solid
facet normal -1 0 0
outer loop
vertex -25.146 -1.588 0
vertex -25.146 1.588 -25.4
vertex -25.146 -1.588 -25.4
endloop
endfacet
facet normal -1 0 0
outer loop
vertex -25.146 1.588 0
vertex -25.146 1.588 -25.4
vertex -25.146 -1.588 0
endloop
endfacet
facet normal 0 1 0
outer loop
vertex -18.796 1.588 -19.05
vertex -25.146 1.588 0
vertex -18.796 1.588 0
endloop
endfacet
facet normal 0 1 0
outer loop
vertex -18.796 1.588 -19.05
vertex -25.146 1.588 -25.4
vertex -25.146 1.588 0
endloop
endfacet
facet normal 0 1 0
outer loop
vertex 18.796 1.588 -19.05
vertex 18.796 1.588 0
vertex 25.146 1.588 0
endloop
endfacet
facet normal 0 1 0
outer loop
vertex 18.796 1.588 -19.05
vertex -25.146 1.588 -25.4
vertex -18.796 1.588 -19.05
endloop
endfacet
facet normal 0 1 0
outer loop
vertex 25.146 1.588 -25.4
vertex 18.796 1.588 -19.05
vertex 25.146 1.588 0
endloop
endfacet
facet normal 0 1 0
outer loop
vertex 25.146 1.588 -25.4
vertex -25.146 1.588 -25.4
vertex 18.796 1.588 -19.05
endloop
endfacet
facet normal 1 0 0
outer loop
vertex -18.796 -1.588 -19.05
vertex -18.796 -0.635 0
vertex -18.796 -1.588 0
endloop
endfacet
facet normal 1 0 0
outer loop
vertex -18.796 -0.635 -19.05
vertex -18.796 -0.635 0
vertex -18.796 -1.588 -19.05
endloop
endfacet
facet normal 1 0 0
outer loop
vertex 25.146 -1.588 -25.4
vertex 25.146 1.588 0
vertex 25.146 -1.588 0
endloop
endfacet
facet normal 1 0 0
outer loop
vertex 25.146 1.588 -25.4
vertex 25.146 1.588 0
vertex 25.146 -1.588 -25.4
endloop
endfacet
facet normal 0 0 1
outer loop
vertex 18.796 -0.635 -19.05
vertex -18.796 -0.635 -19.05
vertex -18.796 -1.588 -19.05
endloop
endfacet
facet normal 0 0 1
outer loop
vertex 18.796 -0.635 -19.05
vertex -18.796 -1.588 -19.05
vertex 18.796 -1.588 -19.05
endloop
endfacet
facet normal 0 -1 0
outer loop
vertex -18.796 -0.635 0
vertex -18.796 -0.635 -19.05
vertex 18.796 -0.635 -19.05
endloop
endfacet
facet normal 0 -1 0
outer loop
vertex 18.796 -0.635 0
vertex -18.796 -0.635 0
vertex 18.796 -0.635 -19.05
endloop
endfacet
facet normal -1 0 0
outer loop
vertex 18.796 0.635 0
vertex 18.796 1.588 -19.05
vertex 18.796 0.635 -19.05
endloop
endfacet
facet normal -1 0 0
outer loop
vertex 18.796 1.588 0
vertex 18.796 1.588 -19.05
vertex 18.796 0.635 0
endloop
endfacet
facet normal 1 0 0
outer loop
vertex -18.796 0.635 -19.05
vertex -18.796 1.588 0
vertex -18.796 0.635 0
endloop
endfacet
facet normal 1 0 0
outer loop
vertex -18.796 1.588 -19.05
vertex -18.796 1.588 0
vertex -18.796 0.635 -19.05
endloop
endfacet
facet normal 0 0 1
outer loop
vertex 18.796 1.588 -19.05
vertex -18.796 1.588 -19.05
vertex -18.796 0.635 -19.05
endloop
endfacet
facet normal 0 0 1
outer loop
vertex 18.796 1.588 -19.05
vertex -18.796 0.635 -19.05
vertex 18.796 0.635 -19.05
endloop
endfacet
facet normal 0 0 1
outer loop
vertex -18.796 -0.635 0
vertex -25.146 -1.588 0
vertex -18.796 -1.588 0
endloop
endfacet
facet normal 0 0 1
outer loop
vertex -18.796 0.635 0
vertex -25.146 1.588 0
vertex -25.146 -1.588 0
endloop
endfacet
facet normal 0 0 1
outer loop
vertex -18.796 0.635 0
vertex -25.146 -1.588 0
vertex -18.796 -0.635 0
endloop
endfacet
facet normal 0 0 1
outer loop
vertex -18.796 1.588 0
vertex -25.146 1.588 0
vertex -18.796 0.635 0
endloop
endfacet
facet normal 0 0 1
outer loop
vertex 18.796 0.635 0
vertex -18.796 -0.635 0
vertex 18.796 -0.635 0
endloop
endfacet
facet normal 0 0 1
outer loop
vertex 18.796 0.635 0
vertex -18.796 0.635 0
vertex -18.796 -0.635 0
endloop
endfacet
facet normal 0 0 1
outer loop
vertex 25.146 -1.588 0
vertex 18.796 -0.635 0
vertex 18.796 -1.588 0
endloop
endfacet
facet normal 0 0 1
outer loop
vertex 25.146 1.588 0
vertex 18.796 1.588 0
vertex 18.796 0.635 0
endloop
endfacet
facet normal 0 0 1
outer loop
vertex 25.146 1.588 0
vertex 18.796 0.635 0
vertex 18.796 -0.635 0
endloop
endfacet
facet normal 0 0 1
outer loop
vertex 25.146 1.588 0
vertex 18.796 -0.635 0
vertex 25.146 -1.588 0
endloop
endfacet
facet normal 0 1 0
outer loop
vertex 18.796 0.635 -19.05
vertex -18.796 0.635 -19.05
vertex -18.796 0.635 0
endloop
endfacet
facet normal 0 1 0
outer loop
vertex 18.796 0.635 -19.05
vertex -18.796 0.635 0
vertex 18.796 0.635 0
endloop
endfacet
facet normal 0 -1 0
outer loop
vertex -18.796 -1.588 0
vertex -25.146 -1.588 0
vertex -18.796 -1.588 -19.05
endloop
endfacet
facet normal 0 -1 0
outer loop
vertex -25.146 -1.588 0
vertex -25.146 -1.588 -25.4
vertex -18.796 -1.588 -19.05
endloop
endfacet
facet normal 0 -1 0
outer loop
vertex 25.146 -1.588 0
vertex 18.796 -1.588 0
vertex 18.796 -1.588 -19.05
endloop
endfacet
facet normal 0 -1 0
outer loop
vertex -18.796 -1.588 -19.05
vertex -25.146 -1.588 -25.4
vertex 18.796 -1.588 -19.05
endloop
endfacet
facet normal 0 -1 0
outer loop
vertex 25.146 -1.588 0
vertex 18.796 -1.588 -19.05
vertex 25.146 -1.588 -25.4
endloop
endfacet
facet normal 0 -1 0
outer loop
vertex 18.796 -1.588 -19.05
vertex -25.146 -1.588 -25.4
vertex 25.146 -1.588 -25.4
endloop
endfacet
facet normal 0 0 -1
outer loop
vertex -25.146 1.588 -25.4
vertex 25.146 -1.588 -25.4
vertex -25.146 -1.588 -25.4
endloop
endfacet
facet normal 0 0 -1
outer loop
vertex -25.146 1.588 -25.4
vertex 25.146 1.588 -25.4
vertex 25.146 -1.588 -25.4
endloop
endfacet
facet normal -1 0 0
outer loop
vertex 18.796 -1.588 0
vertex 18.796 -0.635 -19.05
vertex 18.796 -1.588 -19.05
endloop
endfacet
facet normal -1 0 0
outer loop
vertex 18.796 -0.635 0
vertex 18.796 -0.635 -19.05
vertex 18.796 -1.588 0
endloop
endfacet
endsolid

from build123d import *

# Parameters (mm, degrees)
BOSS_EXTRUDE1_DEPTH = 1.5875
SKETCH2_W           = 37.592
SKETCH2_H           = 19.05
BOSS_EXTRUDE2_DEPTH = 0.635


with BuildPart() as part:
    # Sketch1 → Boss-Extrude1 (new, symmetric)
    with BuildSketch(Plane(origin=(0, 0, 0), x_dir=(1, 0, 0), z_dir=(0, 1, 0))):
        Polygon((-25.146, 0), (-18.796, 0), (-18.796, 19.05), (18.796, 19.05), (18.796, 0), (25.146, 0), (25.146, 25.4), (-25.146, 25.4), align=None)
    extrude(amount=BOSS_EXTRUDE1_DEPTH, both=True)

    # Sketch2 → Boss-Extrude2 (add, symmetric)
    with BuildSketch(Plane(origin=(0, 0, 0), x_dir=(1, 0, 0), z_dir=(0, 1, 0))):
        with Locations((0, 9.525)):
            Rectangle(SKETCH2_W, SKETCH2_H)
    extrude(amount=BOSS_EXTRUDE2_DEPTH, both=True)


solid = part.part
